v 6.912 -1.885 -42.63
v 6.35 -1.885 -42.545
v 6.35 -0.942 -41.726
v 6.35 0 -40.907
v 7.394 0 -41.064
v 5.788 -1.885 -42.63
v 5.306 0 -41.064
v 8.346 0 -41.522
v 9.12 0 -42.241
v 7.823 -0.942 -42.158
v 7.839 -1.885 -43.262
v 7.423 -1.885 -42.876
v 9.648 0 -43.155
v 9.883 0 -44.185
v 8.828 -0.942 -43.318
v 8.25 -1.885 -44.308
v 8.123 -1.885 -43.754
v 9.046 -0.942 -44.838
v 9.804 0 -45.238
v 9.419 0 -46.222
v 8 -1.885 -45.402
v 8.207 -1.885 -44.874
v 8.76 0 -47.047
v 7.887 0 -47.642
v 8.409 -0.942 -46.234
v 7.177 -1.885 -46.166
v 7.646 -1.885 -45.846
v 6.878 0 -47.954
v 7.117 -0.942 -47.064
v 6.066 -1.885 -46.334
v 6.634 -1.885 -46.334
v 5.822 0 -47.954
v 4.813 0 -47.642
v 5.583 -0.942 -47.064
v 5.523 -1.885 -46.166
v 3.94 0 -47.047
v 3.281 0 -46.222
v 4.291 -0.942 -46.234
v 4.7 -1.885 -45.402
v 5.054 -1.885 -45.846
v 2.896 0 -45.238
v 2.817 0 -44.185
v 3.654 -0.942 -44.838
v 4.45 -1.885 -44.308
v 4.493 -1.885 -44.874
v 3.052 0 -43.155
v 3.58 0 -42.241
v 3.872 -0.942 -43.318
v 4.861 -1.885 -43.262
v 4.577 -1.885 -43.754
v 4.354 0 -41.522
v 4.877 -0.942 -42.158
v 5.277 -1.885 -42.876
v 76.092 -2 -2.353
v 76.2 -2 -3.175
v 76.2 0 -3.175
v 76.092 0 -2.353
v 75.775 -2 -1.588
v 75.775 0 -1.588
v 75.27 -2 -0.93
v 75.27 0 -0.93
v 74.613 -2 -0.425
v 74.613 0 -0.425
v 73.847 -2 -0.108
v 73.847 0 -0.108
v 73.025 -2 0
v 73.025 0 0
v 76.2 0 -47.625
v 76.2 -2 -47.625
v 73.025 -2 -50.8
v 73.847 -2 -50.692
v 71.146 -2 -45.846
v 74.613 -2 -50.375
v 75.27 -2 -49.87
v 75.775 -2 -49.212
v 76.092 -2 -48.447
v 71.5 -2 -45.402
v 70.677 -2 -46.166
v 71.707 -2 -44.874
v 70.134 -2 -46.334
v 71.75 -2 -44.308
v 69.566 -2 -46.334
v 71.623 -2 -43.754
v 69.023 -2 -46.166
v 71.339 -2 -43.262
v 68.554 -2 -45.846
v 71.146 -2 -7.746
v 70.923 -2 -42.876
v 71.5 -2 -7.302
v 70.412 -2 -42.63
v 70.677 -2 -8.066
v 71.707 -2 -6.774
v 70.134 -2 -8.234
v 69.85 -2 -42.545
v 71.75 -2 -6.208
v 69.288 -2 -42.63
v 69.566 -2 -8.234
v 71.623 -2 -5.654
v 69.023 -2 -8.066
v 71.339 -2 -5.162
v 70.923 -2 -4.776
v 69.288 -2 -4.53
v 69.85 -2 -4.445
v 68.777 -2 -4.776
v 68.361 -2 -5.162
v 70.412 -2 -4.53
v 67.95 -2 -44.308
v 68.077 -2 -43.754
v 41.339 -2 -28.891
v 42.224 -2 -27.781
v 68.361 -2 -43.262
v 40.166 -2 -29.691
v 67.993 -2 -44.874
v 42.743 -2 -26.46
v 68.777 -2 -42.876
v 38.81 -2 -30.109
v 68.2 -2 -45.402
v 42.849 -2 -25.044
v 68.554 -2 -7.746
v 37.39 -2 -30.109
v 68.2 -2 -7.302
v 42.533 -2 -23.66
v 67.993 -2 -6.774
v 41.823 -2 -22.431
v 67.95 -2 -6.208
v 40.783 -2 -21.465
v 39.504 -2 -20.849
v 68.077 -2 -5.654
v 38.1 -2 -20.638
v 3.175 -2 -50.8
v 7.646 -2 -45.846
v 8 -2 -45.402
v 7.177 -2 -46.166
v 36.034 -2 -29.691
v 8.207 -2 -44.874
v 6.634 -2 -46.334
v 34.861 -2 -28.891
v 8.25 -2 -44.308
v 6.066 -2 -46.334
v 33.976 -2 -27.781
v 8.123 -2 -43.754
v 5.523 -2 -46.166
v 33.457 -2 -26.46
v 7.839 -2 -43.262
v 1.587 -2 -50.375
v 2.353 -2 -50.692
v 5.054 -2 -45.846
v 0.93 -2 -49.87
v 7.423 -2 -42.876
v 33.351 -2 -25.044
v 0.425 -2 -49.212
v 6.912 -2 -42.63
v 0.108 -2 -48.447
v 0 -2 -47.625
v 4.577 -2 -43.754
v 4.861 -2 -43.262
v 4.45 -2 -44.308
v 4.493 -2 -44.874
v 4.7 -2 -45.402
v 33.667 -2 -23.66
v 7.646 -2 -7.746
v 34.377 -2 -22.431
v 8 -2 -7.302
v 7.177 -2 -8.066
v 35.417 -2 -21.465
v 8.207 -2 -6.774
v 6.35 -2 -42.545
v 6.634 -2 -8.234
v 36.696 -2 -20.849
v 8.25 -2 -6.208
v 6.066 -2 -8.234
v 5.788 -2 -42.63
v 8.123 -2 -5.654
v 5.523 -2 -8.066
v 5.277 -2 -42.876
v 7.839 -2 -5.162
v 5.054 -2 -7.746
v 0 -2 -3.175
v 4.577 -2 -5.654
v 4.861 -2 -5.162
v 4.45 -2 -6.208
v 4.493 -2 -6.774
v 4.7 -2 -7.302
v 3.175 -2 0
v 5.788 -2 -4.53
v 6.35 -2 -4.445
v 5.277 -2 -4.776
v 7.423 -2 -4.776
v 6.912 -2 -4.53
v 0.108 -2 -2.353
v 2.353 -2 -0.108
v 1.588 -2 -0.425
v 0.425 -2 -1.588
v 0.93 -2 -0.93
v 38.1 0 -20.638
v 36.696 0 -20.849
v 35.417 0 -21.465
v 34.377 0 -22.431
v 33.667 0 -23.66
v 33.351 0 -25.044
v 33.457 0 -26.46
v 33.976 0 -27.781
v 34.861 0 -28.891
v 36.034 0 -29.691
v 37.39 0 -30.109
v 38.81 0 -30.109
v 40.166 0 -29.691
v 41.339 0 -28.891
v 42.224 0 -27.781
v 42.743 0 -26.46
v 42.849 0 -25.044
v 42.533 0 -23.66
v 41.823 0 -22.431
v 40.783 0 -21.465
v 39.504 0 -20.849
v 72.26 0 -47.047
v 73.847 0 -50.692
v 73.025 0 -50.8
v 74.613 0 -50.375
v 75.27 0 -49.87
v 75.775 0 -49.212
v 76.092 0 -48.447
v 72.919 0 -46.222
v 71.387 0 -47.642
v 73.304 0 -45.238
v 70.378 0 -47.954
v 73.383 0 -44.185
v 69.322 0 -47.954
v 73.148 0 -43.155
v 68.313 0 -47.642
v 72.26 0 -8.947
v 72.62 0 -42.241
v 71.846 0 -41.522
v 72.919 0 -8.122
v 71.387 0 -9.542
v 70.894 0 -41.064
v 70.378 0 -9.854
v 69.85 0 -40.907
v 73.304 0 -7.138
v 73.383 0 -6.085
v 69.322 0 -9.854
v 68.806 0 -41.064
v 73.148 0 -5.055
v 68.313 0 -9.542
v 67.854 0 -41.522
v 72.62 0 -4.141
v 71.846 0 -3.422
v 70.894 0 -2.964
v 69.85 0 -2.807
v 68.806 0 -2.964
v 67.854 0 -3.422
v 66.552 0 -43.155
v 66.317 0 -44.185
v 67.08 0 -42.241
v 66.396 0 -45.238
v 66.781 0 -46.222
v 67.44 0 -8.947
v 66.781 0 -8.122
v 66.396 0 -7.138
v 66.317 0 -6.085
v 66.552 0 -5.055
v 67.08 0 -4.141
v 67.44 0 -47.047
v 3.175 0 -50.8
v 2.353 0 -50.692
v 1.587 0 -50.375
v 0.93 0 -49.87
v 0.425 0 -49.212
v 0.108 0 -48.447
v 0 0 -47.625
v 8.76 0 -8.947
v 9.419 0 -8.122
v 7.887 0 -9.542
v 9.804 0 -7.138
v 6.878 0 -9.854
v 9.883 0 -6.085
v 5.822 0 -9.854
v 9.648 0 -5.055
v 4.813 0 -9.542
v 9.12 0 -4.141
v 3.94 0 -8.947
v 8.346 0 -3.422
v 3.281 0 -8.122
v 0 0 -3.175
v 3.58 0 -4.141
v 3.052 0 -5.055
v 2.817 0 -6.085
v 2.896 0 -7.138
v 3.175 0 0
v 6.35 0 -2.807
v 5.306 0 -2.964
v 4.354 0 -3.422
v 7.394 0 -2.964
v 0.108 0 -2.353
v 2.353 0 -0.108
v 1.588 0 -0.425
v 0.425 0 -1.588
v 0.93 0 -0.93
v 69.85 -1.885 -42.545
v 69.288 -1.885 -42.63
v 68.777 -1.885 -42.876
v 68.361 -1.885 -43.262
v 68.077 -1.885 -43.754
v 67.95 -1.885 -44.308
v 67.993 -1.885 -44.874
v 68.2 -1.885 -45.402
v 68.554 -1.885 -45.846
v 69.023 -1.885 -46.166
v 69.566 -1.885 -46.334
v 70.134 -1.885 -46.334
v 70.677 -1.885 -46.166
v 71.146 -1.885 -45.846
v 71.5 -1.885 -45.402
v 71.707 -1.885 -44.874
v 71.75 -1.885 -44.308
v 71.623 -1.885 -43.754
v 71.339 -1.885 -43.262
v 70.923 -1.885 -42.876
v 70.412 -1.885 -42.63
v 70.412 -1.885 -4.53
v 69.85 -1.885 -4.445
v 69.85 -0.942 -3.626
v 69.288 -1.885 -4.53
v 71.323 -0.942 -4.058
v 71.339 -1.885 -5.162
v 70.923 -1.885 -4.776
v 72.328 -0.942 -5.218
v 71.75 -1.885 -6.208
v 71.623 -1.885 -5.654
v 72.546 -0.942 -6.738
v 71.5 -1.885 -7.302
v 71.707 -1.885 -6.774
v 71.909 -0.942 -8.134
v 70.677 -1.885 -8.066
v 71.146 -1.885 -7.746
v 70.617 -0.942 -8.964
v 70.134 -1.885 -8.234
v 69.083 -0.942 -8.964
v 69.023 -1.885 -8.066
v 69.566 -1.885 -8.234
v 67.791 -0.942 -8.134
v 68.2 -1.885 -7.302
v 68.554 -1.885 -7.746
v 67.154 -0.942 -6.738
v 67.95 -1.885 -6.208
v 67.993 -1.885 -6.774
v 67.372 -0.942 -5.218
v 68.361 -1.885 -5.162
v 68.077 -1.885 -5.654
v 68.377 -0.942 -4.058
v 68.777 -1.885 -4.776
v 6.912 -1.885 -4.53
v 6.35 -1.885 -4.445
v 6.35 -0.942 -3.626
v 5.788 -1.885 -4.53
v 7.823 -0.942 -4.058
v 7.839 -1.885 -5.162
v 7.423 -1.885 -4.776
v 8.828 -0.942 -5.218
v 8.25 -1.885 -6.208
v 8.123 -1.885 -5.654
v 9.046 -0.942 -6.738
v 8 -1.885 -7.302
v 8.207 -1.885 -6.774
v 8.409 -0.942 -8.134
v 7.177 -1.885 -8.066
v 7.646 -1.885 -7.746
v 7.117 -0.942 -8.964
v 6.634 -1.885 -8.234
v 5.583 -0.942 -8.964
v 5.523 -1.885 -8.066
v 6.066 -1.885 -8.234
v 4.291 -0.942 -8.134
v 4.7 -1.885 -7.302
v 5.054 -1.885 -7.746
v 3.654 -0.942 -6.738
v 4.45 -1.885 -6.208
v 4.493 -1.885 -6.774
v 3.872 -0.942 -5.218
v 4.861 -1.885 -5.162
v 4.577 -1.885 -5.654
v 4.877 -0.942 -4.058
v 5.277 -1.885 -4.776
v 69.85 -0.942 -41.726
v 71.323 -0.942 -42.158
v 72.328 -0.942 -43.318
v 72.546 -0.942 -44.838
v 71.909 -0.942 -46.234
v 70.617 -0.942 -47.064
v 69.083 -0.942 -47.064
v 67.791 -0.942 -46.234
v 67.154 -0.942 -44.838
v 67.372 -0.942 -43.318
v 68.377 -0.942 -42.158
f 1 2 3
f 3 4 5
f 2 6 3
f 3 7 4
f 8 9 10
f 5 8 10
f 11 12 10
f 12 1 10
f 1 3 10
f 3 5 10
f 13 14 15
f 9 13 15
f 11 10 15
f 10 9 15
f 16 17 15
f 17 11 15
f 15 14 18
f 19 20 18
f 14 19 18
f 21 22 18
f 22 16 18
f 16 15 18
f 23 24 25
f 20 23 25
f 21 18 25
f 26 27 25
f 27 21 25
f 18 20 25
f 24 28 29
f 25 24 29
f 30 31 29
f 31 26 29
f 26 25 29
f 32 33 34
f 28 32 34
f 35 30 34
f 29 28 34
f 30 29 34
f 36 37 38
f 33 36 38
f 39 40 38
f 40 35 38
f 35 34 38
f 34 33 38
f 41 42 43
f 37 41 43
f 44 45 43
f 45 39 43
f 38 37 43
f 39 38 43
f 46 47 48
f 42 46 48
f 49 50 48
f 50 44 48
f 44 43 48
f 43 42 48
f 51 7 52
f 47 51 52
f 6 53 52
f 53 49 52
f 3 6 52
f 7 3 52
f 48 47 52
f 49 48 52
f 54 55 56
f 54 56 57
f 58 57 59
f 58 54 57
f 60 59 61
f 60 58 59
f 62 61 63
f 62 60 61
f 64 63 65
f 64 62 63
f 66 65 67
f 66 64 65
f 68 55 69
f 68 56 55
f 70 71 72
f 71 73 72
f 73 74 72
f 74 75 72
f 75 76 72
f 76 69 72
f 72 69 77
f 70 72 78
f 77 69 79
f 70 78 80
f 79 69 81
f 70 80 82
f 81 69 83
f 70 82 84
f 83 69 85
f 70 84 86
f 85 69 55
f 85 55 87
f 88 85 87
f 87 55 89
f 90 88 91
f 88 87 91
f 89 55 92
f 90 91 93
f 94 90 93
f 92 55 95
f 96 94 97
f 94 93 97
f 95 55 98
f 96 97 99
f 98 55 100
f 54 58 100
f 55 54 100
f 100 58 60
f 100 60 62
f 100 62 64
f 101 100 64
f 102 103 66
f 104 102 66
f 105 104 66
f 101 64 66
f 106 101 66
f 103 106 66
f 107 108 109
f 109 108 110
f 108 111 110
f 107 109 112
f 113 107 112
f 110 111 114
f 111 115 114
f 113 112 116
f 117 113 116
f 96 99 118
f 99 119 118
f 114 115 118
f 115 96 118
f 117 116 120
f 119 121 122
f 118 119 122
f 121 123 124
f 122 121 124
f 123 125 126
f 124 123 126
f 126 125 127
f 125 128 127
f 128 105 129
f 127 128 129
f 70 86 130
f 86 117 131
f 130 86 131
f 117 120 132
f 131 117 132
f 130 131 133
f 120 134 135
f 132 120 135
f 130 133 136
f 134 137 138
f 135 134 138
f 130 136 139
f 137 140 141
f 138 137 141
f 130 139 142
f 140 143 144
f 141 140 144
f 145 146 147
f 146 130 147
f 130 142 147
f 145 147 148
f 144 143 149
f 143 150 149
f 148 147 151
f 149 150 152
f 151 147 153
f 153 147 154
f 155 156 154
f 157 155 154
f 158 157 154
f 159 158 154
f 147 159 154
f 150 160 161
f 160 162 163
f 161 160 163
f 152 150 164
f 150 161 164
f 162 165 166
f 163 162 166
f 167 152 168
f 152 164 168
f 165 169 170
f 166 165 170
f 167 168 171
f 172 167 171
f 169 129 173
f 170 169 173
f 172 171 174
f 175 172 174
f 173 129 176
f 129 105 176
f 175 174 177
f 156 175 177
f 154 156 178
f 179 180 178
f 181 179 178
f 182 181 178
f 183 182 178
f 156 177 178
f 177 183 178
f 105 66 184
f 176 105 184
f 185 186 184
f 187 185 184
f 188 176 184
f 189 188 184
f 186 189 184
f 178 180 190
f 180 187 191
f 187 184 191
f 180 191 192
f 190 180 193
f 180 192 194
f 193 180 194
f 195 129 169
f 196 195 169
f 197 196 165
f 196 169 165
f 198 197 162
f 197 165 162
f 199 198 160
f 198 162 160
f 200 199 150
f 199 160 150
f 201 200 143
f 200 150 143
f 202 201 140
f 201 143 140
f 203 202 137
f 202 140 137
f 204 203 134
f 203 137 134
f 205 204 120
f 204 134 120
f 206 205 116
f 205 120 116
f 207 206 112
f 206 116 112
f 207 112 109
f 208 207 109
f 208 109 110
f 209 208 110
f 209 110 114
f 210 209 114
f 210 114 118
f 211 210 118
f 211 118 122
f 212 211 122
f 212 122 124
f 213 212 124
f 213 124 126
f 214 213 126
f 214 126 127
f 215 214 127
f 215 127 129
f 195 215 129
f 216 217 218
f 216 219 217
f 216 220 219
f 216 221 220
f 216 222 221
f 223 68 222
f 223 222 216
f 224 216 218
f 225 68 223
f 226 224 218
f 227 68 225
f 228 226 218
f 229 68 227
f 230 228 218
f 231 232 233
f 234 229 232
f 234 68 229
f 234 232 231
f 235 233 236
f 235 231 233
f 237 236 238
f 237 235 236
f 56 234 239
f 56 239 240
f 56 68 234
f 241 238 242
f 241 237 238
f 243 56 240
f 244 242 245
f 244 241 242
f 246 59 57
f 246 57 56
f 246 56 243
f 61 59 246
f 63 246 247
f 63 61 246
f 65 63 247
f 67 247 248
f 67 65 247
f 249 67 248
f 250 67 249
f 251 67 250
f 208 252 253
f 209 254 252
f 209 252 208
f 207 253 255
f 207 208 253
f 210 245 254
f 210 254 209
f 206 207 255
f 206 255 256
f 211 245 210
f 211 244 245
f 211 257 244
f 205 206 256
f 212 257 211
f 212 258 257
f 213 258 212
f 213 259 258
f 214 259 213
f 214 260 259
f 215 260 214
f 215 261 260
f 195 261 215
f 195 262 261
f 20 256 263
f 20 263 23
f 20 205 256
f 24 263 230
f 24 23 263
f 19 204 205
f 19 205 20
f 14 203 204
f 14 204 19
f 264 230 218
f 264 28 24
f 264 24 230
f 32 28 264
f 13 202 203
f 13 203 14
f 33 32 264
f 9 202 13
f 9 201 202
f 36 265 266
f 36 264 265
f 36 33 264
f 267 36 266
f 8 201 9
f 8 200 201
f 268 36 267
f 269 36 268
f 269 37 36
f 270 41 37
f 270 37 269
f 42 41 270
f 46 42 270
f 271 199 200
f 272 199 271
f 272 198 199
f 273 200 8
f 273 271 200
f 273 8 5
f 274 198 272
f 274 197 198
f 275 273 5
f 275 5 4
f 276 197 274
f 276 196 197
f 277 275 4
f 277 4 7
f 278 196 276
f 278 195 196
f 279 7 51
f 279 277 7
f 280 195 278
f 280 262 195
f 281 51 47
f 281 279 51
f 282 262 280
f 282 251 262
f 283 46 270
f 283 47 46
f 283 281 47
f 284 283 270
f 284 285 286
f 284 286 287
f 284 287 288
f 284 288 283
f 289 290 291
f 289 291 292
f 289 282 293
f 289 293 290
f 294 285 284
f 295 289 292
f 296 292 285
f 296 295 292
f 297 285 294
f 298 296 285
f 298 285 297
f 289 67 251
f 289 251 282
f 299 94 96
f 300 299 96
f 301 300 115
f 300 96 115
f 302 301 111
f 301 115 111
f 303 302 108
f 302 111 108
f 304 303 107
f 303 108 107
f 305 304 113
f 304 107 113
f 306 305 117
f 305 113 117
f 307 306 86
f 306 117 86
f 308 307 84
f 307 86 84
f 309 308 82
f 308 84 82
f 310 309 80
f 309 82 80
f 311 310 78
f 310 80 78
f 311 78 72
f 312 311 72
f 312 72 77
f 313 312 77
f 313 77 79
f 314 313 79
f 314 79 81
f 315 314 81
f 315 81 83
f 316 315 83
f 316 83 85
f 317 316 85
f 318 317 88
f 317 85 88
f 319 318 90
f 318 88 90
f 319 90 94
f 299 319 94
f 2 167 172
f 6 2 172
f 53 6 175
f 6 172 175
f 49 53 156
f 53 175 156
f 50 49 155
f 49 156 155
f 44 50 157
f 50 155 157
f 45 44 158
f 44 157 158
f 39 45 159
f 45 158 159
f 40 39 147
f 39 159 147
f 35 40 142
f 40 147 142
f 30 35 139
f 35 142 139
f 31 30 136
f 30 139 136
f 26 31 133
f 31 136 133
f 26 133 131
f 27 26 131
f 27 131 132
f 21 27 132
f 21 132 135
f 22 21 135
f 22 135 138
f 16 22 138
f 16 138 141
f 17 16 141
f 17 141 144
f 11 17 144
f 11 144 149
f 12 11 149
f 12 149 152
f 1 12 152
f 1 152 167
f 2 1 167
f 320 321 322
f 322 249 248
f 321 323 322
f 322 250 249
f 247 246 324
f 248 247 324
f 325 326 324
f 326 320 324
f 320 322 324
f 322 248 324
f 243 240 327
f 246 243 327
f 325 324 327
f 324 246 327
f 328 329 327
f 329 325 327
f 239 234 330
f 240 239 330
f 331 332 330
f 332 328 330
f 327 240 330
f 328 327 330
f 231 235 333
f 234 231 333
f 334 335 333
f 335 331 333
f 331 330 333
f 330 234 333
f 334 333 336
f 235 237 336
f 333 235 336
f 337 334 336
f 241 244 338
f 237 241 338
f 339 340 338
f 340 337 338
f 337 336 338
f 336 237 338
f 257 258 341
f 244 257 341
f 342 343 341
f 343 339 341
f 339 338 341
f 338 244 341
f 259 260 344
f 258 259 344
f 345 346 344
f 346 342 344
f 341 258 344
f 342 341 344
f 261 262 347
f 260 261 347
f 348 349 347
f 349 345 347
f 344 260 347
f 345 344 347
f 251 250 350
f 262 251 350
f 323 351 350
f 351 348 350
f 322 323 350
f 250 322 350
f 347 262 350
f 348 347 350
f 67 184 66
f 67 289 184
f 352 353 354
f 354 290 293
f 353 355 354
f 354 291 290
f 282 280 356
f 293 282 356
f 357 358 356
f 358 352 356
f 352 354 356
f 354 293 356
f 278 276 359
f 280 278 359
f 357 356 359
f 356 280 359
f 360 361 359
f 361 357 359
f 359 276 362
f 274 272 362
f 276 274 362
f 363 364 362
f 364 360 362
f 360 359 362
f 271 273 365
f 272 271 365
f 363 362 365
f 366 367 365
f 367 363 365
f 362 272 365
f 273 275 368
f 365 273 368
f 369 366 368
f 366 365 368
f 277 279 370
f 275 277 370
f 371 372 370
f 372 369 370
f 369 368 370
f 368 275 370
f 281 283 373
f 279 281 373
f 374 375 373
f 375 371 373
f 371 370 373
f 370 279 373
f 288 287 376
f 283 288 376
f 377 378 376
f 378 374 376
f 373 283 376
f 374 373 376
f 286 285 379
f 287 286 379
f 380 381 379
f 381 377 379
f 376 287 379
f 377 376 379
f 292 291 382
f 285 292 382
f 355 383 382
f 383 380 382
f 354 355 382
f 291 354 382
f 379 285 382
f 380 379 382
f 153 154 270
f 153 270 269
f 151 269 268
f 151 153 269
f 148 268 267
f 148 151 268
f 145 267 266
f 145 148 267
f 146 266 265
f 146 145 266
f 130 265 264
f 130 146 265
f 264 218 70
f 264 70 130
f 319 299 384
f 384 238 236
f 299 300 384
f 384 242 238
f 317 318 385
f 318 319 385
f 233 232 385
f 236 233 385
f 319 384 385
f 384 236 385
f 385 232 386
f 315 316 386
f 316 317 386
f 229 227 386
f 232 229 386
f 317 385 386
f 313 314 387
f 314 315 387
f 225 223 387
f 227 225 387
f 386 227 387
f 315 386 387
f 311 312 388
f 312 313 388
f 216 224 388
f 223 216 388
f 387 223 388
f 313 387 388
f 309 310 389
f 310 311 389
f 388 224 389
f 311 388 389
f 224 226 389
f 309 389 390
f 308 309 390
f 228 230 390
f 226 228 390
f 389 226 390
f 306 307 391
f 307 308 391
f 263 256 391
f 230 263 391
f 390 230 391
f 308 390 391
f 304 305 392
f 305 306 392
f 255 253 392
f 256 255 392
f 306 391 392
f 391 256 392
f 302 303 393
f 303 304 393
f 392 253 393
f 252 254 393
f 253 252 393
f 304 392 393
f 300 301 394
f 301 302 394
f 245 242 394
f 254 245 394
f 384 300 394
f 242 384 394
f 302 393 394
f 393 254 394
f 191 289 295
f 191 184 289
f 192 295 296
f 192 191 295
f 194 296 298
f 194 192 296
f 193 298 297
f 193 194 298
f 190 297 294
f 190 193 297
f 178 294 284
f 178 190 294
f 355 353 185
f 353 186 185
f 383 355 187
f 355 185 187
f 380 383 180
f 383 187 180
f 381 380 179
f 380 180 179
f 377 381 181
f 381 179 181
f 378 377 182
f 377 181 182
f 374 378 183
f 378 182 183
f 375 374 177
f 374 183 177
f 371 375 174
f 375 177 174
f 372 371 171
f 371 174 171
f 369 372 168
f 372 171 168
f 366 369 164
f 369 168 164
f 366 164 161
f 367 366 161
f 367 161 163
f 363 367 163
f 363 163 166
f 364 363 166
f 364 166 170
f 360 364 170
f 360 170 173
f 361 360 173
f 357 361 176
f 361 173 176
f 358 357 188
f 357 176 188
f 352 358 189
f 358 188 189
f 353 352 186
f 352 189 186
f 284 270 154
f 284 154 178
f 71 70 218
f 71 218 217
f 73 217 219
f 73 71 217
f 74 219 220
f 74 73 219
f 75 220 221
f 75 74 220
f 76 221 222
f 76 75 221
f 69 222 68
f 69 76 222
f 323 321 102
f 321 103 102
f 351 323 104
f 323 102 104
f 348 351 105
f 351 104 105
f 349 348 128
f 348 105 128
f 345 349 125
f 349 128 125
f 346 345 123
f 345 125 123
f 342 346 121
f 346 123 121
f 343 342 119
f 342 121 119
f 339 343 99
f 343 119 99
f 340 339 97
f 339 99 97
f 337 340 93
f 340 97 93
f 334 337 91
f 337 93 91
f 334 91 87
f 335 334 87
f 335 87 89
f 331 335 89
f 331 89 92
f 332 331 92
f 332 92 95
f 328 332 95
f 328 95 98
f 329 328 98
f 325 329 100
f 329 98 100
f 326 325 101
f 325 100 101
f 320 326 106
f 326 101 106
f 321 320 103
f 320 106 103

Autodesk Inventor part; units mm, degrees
ref_plane "YZ Plane" through (0, 0, 0) normal (1, 0, 0) x (0, 1, 0)
ref_plane "XZ Plane" through (0, 0, 0) normal (0, 1, 0) x (-1, 0, 0)
ref_plane "XY Plane" through (0, 0, 0) normal (0, 0, 1) x (1, 0, 0)
sketch "Profile" plane through (0, 0, 0) normal (0, 1, 0) x (-1, 0, 0)
  line L0 (0, 0) -> (-76.2, 0)
  line L1 (-76.2, 0) -> (-76.2, -50.8)
  line L2 (-76.2, -50.8) -> (0, -50.8)
  line L3 (0, -50.8) -> (0, 0)
  line L4 (0, -25.4) -> (-76.2, -25.4)
  line L5 (-38.1, -50.8) -> (-38.1, 0)
  line L6 (-6.35, -44.45) -> (-69.85, -44.45) construction
  line L7 (-69.85, -44.45) -> (-69.85, -6.35) construction
  line L8 (-69.85, -6.35) -> (-6.35, -6.35) construction
  line L9 (-6.35, -6.35) -> (-6.35, -44.45) construction
  line L10 (-6.35, -44.45) -> (-69.85, -6.35) construction
  line L11 (-69.85, -44.45) -> (-6.35, -6.35) construction
  circle A0 centre (-38.1, -25.4) radius 4.5
  dimension "d0" = 76.2
  dimension "d1" = 50.8
  dimension "d2" = 63.5
  dimension "d3" = 38.1
  dimension "d13" = 9
extrude "Plate1" add sketch "Profile" against normal blind 2
hole "#6 Mounting Hole" at (6.35, 0, -44.45) direction (0, -1, 0) diameter 3.81 end through all countersink diameter 7.0866 countersink angle 82 clearance for "Flat Head Machine Screw (82)" size "#6" standard "Ansi Unified Screw Threads"
pattern_sketch "Jack Plate Mounting Holes" of "#6 Mounting Hole" from (6.35, 0, -44.45) copies at (69.85, 0, -44.45) at (69.85, 0, -6.35) at (6.35, 0, -6.35)
hole "Input Jack Hole" at (38.1, 0, -25.4) direction (0, -1, 0) diameter 9.525 end through all
fillet "Corner Round1" radius 3.175 4 edges at (0, -1, -50.8) (76.2, -1, -50.8) (76.2, -1, 0) (0, -1, 0)
equation "\"d11\" = Thickness"
equation "\"d5\" = Thickness"
equation "\"BendRadius\" = Thickness"
equation "\"BendReliefWidth\" = Thickness"
equation "\"BendReliefDepth\" = 0.5 * Thickness"
equation "\"CornerReliefSize\" = 4 * Thickness"
equation "\"MinimumRemnant\" = 2 * Thickness"
equation "\"TransitionRadius\" = BendRadius"
equation "\"JacobiRadiusSize\" = BendRadius"
equation "\"GapSize\" = Thickness"
equation "\"Thickness\" = 2"
properties part number "Jack Plate" material "Aluminum 6061"
